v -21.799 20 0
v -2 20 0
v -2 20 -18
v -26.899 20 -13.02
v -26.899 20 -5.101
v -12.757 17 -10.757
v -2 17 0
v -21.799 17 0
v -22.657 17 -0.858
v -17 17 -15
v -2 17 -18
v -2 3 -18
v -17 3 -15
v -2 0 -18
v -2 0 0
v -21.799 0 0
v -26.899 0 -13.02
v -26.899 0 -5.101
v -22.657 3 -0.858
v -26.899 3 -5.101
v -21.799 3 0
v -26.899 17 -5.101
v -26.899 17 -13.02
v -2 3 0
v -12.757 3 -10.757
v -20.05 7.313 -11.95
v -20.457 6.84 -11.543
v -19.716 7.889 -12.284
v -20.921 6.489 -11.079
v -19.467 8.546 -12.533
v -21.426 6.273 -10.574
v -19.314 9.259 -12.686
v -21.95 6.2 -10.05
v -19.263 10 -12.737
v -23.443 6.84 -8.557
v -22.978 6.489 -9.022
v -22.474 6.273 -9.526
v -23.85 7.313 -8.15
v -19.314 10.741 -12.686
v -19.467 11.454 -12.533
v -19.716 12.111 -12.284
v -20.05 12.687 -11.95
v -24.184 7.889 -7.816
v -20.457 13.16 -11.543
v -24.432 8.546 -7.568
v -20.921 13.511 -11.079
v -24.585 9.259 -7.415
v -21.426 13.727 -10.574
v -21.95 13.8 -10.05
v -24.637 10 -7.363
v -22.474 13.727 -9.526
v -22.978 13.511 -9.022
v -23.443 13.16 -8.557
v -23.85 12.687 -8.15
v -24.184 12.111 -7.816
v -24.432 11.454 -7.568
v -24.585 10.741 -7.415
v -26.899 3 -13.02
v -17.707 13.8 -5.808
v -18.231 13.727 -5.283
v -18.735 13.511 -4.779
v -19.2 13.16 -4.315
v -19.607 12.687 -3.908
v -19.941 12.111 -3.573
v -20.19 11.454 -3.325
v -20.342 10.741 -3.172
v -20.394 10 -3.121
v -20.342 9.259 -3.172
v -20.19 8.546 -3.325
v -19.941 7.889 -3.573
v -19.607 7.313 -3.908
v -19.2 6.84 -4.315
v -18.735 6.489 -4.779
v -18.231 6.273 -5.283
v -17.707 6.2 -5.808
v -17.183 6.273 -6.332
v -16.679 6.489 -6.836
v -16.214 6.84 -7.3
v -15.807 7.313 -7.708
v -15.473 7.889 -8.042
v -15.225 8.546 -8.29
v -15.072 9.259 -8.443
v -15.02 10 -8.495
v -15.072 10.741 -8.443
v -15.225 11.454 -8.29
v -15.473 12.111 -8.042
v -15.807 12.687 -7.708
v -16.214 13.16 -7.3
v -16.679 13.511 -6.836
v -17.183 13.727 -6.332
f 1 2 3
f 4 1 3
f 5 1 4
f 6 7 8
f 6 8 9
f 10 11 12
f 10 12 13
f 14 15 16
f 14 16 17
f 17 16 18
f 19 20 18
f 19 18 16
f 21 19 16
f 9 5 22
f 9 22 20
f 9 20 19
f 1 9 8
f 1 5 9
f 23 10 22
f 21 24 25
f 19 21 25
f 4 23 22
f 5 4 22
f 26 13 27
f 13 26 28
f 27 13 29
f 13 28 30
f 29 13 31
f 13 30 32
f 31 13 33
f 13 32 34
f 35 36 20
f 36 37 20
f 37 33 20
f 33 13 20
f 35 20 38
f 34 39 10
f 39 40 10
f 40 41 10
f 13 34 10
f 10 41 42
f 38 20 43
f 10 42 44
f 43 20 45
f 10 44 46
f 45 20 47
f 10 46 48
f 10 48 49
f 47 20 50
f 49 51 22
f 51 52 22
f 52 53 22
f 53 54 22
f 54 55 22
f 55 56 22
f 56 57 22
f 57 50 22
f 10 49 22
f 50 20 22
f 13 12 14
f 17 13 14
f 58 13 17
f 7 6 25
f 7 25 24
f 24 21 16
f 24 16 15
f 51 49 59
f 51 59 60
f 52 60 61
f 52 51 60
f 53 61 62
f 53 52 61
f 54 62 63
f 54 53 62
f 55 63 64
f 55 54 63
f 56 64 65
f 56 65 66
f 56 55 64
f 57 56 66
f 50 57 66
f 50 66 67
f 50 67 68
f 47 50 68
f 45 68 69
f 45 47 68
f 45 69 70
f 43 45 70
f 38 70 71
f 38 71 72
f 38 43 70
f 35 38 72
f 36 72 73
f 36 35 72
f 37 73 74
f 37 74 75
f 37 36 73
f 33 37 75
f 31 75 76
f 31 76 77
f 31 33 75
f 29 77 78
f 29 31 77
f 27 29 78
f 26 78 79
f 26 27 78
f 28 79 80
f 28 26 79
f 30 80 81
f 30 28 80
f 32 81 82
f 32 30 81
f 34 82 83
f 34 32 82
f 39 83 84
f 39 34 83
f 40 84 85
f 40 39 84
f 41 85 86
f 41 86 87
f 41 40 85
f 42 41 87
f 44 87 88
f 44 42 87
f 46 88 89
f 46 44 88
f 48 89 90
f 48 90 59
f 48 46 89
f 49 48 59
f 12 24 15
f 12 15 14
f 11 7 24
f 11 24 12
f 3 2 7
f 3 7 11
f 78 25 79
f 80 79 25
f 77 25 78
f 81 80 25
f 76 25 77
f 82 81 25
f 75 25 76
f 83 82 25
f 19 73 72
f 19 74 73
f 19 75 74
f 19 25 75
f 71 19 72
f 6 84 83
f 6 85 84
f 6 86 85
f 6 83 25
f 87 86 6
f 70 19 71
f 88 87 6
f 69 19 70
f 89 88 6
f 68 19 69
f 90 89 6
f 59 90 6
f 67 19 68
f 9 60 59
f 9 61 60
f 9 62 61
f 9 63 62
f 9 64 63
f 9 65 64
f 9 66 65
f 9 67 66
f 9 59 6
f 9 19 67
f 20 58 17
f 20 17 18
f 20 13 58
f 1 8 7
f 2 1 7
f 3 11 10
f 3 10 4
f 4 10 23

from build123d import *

# Parameters (mm, degrees)
SKETCH008_W             = 14
SKETCH008_H             = 14
SKETCH008_R             = 3.8
PAD007_DEPTH            = 6
PAD008_DEPTH            = 14
PAD009_DEPTH            = 3
PAD010_DEPTH            = 3
BODY002_PLACEMENT_ANGLE = 315


with BuildPart() as part:
    # Sketch008 → Pad007 (new body)
    with BuildSketch(Plane.YZ):
        with Locations((-12, 7)):
            Rectangle(SKETCH008_W, SKETCH008_H)
        with Locations((-12, 7)):
            Circle(SKETCH008_R, mode=Mode.SUBTRACT)
    extrude(amount=PAD007_DEPTH)

    # Sketch009 → Pad008 (join)
    with BuildSketch(Plane.XZ.offset(5)):
        Polygon((0, 0), (21.213203, 0), (8.485281, -12.727922), align=None)
    extrude(amount=PAD008_DEPTH)

    # Sketch010 → Pad009 (join)
    with BuildSketch(Plane.XZ.offset(5)):
        Polygon((0, 14), (7.213203, 14), (21.213203, 0), (8.485281, -12.727922), (-5.6, 8.4), align=None)
    extrude(amount=-PAD009_DEPTH)

    # Sketch011 → Pad010 (join)
    with BuildSketch(Plane.XZ.offset(19)):
        Polygon((0, 14), (7.213203, 14), (21.213203, 0), (8.485281, -12.727922), (-5.6, 8.4), align=None)
    extrude(amount=PAD010_DEPTH)


with BuildPart() as part_1:
    # Body002 placement: moved
    add(part.part.moved(Location((-17, 22, -15))).rotate(Axis((-17, 22, -15), (0, 1, 0)), BODY002_PLACEMENT_ANGLE))


solid = part_1.part
